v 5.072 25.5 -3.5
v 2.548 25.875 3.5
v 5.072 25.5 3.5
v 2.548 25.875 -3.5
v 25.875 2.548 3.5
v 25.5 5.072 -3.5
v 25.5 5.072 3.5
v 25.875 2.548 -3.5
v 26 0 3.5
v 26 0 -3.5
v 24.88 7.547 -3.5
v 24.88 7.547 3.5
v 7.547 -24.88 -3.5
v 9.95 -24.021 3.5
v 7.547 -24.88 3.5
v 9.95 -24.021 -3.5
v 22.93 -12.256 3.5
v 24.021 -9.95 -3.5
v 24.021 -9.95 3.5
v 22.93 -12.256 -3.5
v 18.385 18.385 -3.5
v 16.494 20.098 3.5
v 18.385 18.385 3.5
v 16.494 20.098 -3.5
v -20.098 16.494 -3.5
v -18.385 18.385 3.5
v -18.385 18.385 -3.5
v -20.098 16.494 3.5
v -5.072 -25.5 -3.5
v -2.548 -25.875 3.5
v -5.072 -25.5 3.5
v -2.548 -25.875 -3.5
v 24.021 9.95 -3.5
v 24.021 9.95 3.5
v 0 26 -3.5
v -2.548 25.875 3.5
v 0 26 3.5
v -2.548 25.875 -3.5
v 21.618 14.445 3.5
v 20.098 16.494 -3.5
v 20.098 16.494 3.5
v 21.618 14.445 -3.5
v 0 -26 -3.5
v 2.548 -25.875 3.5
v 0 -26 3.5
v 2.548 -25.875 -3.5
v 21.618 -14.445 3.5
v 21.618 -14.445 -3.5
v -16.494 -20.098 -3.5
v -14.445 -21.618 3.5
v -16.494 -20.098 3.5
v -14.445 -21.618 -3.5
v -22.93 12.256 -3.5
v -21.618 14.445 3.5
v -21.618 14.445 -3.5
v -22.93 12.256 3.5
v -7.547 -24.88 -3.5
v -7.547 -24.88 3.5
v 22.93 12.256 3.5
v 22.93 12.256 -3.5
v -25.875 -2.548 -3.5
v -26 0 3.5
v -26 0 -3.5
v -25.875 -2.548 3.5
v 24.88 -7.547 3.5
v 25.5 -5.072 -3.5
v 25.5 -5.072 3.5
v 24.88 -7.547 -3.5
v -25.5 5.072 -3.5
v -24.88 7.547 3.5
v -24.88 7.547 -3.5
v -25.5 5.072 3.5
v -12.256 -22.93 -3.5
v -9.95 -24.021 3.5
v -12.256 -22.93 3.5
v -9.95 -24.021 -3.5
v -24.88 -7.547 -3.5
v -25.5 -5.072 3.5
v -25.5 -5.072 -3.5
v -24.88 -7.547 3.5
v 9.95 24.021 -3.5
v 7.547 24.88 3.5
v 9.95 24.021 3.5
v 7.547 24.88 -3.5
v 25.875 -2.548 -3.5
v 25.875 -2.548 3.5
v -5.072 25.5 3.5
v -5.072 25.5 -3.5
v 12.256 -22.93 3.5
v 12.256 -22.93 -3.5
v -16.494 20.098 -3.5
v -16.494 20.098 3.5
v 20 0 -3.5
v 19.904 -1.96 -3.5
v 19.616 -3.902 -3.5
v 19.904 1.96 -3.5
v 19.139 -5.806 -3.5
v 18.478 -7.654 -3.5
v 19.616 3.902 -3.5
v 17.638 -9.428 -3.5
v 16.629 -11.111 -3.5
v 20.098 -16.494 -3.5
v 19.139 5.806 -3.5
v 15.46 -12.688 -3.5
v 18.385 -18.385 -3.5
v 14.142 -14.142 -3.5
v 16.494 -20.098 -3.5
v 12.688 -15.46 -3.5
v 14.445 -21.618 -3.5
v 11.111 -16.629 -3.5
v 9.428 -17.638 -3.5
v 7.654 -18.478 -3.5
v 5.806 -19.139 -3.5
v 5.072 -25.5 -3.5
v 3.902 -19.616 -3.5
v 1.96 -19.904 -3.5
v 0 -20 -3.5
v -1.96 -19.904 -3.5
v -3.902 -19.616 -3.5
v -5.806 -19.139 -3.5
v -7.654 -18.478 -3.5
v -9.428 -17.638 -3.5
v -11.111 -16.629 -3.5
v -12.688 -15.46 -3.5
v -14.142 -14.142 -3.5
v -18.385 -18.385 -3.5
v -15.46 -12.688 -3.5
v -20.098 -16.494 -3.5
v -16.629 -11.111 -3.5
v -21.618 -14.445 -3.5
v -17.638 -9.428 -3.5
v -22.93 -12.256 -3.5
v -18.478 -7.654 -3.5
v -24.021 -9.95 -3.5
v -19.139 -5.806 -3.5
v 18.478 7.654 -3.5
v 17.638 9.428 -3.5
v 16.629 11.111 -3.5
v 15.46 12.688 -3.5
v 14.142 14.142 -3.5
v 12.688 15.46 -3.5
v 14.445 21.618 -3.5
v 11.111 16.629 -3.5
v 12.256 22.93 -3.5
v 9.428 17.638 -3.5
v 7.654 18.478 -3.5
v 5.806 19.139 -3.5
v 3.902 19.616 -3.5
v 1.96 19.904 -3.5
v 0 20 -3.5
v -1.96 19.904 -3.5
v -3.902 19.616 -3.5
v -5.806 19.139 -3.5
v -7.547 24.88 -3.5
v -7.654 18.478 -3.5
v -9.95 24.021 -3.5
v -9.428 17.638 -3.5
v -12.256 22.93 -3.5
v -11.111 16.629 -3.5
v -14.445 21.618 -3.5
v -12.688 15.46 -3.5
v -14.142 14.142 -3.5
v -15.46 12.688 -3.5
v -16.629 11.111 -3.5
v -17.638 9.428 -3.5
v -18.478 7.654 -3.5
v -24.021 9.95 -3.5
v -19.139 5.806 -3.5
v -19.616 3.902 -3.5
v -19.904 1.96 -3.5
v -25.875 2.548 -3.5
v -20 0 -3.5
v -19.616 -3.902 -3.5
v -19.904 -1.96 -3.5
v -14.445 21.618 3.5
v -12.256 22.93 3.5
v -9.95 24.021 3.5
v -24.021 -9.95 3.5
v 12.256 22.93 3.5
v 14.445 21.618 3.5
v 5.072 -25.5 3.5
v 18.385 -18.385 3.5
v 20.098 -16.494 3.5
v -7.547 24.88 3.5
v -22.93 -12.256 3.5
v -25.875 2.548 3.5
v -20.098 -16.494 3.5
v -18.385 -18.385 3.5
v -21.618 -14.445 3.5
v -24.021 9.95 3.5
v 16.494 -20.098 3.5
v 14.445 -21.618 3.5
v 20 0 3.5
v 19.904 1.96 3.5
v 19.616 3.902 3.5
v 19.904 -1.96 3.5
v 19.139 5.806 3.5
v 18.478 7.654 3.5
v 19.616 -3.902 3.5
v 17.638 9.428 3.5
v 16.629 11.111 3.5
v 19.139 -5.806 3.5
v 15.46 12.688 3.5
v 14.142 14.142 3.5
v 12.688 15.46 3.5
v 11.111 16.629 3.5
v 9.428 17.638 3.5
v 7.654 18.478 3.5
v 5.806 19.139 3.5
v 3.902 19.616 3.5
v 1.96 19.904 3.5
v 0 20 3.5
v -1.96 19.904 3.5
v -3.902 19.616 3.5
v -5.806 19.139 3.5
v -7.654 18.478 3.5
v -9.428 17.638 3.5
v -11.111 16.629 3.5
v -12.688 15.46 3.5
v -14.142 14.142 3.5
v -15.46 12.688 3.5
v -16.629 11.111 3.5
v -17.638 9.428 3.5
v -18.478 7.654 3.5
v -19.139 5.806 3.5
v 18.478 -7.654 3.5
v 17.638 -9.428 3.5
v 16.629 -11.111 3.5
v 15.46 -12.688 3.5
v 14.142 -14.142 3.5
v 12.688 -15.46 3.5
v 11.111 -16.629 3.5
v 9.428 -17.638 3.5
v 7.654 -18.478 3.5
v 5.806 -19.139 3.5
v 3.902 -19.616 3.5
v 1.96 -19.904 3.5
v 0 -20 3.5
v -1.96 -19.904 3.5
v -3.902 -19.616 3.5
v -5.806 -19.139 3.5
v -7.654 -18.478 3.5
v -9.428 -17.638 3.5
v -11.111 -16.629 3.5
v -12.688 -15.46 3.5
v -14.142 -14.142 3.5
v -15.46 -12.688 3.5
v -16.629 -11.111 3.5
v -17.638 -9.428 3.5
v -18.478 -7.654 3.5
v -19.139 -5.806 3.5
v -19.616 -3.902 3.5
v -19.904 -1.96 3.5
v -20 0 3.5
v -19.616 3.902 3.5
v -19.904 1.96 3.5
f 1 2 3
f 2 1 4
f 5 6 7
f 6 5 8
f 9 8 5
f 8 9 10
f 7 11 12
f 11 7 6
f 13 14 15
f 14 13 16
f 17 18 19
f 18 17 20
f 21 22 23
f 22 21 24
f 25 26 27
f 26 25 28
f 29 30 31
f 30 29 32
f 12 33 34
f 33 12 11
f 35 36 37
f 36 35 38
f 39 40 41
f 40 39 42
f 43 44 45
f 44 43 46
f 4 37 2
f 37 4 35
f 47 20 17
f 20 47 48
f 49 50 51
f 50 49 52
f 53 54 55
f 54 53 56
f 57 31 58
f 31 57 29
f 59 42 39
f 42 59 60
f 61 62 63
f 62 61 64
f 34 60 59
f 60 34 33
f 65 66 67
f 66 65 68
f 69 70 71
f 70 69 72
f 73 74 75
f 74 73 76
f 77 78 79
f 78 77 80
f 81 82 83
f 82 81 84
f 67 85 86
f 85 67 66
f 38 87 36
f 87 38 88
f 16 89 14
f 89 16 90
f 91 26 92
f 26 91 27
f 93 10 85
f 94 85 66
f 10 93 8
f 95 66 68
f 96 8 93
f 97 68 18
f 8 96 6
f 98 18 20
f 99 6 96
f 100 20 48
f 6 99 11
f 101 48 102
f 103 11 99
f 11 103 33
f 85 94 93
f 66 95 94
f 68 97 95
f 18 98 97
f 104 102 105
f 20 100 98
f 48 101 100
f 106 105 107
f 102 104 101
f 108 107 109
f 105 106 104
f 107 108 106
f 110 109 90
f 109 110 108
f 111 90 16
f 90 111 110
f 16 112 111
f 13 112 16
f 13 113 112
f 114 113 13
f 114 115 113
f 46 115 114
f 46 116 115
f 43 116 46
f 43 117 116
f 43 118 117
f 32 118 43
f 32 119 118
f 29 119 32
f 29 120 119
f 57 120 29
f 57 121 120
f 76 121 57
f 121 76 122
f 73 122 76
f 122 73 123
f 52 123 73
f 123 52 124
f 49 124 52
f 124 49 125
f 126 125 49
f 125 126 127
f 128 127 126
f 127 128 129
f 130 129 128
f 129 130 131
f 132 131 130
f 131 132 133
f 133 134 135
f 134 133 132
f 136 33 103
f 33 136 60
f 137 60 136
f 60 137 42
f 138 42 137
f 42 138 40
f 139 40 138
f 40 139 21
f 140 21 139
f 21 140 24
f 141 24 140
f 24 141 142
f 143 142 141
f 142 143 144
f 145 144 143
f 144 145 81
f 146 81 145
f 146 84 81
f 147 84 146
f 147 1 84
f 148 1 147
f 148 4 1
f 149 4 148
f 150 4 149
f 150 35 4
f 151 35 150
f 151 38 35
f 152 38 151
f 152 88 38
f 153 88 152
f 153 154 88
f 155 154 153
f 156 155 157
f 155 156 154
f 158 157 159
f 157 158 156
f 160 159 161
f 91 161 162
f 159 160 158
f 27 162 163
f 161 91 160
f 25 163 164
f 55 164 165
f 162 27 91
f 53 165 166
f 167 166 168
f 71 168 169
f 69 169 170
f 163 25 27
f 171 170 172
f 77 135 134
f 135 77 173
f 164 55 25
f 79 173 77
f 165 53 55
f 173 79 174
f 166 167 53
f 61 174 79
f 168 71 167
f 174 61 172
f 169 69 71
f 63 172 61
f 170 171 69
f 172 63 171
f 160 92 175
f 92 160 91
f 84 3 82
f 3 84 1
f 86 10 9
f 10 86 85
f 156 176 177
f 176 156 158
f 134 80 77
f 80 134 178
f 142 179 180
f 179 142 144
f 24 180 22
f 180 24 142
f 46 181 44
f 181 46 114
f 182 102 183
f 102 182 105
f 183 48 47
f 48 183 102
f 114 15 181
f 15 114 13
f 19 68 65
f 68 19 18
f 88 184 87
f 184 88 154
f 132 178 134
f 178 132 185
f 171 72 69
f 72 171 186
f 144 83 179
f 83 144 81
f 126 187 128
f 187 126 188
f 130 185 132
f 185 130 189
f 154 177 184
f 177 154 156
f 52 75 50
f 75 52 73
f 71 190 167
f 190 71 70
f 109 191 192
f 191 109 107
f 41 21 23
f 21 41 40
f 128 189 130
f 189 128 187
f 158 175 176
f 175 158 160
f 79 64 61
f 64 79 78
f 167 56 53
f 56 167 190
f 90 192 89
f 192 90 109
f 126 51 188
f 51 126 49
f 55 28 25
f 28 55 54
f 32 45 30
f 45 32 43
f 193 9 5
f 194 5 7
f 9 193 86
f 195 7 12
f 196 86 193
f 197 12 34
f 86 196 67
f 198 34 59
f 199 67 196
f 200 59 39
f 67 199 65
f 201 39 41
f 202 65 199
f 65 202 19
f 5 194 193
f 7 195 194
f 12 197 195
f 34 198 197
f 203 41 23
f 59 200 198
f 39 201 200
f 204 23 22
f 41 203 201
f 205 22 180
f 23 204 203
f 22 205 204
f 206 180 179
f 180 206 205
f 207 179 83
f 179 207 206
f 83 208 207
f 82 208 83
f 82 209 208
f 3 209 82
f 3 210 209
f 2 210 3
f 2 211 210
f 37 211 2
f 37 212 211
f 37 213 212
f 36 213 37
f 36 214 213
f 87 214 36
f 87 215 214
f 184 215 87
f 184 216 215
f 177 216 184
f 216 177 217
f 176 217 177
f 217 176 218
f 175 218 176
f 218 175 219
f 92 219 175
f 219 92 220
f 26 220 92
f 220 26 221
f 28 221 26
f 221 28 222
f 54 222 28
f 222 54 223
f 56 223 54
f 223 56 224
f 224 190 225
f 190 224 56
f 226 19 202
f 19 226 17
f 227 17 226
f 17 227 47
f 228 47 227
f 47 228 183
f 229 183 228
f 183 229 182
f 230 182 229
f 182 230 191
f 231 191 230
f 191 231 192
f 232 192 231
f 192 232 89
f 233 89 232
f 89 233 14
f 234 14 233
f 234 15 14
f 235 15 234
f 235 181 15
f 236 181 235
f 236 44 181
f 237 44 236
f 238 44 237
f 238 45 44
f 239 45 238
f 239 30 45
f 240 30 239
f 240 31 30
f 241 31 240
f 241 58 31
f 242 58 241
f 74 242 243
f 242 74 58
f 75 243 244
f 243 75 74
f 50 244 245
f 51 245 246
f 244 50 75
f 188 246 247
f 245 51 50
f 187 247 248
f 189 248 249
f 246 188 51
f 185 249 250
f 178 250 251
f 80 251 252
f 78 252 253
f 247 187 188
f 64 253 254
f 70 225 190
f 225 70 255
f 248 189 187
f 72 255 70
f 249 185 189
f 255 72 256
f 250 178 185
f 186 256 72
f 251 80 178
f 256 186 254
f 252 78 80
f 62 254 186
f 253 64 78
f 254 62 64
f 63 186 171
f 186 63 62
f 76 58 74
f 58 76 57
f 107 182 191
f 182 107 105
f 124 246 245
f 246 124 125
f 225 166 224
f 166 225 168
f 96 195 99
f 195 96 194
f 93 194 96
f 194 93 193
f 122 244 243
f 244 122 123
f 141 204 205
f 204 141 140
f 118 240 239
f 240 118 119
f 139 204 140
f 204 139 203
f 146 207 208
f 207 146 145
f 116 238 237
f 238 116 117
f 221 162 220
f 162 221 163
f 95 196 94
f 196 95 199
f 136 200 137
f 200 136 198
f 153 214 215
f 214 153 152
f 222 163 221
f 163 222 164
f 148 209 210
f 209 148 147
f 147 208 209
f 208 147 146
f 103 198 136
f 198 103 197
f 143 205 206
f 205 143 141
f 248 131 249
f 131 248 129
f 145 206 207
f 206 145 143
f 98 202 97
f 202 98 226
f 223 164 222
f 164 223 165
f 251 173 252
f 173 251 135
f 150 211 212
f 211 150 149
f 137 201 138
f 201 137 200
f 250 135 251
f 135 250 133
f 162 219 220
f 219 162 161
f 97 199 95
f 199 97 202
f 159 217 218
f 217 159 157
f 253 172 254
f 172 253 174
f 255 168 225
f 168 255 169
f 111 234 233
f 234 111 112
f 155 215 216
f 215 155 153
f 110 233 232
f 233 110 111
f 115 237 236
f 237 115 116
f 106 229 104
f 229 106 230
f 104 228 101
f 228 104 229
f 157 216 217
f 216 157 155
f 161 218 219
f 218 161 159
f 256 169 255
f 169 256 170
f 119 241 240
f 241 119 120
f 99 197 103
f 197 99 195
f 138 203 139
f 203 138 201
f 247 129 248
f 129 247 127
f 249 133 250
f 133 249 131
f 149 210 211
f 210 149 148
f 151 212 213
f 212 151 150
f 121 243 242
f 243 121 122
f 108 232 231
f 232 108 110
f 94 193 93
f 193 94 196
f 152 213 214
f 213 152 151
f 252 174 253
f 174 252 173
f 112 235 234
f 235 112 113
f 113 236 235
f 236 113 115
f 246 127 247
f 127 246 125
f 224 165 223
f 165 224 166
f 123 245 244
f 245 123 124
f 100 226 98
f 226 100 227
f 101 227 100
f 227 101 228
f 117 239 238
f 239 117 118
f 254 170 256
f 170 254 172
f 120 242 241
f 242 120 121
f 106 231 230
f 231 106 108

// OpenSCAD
// Parameters
bore_diameter_mm = 40; //[20:80:0.5]
outer_diameter_mm = 52; //[26:104:0.5]
width_mm = 7; //[3.5:14:0.1]
bore_radius_mm = 20; //[10:40:0.5]
outer_radius_mm = 26; //[13:52:0.5]
ring_radial_thickness_mm = 3; //[1.5:6:0.1]
ball_diameter_mm = 3; //[1.5:6:0.1]
overlap_mm = 1; //[0.5:2:0.1]

// Ball Bearing - complete geometry
module ball_bearing() {
  color("Silver") {
    // Outer Ring
    difference() {
      cylinder(r=outer_radius_mm, h=width_mm, center=true, $fn=64);
      cylinder(r=outer_radius_mm - ring_radial_thickness_mm, h=width_mm + 2*overlap_mm, center=true, $fn=64);
    }
    // Inner Ring
    difference() {
      cylinder(r=bore_radius_mm + ring_radial_thickness_mm, h=width_mm, center=true, $fn=64);
      cylinder(r=bore_radius_mm, h=width_mm + 2*overlap_mm, center=true, $fn=64);
    }
  }
}

// Bearing Ball - complete geometry
module bearing_ball() {
  color("DimGray") {
    translate([(bore_radius_mm + ring_radial_thickness_mm) + ((outer_radius_mm - ring_radial_thickness_mm) - (bore_radius_mm + ring_radial_thickness_mm))/2, 0, 0])
      sphere(r=ball_diameter_mm/2, $fn=32);
  }
}

// Assembly
module assembly() {
  ball_bearing();
  bearing_ball();
}

assembly();
